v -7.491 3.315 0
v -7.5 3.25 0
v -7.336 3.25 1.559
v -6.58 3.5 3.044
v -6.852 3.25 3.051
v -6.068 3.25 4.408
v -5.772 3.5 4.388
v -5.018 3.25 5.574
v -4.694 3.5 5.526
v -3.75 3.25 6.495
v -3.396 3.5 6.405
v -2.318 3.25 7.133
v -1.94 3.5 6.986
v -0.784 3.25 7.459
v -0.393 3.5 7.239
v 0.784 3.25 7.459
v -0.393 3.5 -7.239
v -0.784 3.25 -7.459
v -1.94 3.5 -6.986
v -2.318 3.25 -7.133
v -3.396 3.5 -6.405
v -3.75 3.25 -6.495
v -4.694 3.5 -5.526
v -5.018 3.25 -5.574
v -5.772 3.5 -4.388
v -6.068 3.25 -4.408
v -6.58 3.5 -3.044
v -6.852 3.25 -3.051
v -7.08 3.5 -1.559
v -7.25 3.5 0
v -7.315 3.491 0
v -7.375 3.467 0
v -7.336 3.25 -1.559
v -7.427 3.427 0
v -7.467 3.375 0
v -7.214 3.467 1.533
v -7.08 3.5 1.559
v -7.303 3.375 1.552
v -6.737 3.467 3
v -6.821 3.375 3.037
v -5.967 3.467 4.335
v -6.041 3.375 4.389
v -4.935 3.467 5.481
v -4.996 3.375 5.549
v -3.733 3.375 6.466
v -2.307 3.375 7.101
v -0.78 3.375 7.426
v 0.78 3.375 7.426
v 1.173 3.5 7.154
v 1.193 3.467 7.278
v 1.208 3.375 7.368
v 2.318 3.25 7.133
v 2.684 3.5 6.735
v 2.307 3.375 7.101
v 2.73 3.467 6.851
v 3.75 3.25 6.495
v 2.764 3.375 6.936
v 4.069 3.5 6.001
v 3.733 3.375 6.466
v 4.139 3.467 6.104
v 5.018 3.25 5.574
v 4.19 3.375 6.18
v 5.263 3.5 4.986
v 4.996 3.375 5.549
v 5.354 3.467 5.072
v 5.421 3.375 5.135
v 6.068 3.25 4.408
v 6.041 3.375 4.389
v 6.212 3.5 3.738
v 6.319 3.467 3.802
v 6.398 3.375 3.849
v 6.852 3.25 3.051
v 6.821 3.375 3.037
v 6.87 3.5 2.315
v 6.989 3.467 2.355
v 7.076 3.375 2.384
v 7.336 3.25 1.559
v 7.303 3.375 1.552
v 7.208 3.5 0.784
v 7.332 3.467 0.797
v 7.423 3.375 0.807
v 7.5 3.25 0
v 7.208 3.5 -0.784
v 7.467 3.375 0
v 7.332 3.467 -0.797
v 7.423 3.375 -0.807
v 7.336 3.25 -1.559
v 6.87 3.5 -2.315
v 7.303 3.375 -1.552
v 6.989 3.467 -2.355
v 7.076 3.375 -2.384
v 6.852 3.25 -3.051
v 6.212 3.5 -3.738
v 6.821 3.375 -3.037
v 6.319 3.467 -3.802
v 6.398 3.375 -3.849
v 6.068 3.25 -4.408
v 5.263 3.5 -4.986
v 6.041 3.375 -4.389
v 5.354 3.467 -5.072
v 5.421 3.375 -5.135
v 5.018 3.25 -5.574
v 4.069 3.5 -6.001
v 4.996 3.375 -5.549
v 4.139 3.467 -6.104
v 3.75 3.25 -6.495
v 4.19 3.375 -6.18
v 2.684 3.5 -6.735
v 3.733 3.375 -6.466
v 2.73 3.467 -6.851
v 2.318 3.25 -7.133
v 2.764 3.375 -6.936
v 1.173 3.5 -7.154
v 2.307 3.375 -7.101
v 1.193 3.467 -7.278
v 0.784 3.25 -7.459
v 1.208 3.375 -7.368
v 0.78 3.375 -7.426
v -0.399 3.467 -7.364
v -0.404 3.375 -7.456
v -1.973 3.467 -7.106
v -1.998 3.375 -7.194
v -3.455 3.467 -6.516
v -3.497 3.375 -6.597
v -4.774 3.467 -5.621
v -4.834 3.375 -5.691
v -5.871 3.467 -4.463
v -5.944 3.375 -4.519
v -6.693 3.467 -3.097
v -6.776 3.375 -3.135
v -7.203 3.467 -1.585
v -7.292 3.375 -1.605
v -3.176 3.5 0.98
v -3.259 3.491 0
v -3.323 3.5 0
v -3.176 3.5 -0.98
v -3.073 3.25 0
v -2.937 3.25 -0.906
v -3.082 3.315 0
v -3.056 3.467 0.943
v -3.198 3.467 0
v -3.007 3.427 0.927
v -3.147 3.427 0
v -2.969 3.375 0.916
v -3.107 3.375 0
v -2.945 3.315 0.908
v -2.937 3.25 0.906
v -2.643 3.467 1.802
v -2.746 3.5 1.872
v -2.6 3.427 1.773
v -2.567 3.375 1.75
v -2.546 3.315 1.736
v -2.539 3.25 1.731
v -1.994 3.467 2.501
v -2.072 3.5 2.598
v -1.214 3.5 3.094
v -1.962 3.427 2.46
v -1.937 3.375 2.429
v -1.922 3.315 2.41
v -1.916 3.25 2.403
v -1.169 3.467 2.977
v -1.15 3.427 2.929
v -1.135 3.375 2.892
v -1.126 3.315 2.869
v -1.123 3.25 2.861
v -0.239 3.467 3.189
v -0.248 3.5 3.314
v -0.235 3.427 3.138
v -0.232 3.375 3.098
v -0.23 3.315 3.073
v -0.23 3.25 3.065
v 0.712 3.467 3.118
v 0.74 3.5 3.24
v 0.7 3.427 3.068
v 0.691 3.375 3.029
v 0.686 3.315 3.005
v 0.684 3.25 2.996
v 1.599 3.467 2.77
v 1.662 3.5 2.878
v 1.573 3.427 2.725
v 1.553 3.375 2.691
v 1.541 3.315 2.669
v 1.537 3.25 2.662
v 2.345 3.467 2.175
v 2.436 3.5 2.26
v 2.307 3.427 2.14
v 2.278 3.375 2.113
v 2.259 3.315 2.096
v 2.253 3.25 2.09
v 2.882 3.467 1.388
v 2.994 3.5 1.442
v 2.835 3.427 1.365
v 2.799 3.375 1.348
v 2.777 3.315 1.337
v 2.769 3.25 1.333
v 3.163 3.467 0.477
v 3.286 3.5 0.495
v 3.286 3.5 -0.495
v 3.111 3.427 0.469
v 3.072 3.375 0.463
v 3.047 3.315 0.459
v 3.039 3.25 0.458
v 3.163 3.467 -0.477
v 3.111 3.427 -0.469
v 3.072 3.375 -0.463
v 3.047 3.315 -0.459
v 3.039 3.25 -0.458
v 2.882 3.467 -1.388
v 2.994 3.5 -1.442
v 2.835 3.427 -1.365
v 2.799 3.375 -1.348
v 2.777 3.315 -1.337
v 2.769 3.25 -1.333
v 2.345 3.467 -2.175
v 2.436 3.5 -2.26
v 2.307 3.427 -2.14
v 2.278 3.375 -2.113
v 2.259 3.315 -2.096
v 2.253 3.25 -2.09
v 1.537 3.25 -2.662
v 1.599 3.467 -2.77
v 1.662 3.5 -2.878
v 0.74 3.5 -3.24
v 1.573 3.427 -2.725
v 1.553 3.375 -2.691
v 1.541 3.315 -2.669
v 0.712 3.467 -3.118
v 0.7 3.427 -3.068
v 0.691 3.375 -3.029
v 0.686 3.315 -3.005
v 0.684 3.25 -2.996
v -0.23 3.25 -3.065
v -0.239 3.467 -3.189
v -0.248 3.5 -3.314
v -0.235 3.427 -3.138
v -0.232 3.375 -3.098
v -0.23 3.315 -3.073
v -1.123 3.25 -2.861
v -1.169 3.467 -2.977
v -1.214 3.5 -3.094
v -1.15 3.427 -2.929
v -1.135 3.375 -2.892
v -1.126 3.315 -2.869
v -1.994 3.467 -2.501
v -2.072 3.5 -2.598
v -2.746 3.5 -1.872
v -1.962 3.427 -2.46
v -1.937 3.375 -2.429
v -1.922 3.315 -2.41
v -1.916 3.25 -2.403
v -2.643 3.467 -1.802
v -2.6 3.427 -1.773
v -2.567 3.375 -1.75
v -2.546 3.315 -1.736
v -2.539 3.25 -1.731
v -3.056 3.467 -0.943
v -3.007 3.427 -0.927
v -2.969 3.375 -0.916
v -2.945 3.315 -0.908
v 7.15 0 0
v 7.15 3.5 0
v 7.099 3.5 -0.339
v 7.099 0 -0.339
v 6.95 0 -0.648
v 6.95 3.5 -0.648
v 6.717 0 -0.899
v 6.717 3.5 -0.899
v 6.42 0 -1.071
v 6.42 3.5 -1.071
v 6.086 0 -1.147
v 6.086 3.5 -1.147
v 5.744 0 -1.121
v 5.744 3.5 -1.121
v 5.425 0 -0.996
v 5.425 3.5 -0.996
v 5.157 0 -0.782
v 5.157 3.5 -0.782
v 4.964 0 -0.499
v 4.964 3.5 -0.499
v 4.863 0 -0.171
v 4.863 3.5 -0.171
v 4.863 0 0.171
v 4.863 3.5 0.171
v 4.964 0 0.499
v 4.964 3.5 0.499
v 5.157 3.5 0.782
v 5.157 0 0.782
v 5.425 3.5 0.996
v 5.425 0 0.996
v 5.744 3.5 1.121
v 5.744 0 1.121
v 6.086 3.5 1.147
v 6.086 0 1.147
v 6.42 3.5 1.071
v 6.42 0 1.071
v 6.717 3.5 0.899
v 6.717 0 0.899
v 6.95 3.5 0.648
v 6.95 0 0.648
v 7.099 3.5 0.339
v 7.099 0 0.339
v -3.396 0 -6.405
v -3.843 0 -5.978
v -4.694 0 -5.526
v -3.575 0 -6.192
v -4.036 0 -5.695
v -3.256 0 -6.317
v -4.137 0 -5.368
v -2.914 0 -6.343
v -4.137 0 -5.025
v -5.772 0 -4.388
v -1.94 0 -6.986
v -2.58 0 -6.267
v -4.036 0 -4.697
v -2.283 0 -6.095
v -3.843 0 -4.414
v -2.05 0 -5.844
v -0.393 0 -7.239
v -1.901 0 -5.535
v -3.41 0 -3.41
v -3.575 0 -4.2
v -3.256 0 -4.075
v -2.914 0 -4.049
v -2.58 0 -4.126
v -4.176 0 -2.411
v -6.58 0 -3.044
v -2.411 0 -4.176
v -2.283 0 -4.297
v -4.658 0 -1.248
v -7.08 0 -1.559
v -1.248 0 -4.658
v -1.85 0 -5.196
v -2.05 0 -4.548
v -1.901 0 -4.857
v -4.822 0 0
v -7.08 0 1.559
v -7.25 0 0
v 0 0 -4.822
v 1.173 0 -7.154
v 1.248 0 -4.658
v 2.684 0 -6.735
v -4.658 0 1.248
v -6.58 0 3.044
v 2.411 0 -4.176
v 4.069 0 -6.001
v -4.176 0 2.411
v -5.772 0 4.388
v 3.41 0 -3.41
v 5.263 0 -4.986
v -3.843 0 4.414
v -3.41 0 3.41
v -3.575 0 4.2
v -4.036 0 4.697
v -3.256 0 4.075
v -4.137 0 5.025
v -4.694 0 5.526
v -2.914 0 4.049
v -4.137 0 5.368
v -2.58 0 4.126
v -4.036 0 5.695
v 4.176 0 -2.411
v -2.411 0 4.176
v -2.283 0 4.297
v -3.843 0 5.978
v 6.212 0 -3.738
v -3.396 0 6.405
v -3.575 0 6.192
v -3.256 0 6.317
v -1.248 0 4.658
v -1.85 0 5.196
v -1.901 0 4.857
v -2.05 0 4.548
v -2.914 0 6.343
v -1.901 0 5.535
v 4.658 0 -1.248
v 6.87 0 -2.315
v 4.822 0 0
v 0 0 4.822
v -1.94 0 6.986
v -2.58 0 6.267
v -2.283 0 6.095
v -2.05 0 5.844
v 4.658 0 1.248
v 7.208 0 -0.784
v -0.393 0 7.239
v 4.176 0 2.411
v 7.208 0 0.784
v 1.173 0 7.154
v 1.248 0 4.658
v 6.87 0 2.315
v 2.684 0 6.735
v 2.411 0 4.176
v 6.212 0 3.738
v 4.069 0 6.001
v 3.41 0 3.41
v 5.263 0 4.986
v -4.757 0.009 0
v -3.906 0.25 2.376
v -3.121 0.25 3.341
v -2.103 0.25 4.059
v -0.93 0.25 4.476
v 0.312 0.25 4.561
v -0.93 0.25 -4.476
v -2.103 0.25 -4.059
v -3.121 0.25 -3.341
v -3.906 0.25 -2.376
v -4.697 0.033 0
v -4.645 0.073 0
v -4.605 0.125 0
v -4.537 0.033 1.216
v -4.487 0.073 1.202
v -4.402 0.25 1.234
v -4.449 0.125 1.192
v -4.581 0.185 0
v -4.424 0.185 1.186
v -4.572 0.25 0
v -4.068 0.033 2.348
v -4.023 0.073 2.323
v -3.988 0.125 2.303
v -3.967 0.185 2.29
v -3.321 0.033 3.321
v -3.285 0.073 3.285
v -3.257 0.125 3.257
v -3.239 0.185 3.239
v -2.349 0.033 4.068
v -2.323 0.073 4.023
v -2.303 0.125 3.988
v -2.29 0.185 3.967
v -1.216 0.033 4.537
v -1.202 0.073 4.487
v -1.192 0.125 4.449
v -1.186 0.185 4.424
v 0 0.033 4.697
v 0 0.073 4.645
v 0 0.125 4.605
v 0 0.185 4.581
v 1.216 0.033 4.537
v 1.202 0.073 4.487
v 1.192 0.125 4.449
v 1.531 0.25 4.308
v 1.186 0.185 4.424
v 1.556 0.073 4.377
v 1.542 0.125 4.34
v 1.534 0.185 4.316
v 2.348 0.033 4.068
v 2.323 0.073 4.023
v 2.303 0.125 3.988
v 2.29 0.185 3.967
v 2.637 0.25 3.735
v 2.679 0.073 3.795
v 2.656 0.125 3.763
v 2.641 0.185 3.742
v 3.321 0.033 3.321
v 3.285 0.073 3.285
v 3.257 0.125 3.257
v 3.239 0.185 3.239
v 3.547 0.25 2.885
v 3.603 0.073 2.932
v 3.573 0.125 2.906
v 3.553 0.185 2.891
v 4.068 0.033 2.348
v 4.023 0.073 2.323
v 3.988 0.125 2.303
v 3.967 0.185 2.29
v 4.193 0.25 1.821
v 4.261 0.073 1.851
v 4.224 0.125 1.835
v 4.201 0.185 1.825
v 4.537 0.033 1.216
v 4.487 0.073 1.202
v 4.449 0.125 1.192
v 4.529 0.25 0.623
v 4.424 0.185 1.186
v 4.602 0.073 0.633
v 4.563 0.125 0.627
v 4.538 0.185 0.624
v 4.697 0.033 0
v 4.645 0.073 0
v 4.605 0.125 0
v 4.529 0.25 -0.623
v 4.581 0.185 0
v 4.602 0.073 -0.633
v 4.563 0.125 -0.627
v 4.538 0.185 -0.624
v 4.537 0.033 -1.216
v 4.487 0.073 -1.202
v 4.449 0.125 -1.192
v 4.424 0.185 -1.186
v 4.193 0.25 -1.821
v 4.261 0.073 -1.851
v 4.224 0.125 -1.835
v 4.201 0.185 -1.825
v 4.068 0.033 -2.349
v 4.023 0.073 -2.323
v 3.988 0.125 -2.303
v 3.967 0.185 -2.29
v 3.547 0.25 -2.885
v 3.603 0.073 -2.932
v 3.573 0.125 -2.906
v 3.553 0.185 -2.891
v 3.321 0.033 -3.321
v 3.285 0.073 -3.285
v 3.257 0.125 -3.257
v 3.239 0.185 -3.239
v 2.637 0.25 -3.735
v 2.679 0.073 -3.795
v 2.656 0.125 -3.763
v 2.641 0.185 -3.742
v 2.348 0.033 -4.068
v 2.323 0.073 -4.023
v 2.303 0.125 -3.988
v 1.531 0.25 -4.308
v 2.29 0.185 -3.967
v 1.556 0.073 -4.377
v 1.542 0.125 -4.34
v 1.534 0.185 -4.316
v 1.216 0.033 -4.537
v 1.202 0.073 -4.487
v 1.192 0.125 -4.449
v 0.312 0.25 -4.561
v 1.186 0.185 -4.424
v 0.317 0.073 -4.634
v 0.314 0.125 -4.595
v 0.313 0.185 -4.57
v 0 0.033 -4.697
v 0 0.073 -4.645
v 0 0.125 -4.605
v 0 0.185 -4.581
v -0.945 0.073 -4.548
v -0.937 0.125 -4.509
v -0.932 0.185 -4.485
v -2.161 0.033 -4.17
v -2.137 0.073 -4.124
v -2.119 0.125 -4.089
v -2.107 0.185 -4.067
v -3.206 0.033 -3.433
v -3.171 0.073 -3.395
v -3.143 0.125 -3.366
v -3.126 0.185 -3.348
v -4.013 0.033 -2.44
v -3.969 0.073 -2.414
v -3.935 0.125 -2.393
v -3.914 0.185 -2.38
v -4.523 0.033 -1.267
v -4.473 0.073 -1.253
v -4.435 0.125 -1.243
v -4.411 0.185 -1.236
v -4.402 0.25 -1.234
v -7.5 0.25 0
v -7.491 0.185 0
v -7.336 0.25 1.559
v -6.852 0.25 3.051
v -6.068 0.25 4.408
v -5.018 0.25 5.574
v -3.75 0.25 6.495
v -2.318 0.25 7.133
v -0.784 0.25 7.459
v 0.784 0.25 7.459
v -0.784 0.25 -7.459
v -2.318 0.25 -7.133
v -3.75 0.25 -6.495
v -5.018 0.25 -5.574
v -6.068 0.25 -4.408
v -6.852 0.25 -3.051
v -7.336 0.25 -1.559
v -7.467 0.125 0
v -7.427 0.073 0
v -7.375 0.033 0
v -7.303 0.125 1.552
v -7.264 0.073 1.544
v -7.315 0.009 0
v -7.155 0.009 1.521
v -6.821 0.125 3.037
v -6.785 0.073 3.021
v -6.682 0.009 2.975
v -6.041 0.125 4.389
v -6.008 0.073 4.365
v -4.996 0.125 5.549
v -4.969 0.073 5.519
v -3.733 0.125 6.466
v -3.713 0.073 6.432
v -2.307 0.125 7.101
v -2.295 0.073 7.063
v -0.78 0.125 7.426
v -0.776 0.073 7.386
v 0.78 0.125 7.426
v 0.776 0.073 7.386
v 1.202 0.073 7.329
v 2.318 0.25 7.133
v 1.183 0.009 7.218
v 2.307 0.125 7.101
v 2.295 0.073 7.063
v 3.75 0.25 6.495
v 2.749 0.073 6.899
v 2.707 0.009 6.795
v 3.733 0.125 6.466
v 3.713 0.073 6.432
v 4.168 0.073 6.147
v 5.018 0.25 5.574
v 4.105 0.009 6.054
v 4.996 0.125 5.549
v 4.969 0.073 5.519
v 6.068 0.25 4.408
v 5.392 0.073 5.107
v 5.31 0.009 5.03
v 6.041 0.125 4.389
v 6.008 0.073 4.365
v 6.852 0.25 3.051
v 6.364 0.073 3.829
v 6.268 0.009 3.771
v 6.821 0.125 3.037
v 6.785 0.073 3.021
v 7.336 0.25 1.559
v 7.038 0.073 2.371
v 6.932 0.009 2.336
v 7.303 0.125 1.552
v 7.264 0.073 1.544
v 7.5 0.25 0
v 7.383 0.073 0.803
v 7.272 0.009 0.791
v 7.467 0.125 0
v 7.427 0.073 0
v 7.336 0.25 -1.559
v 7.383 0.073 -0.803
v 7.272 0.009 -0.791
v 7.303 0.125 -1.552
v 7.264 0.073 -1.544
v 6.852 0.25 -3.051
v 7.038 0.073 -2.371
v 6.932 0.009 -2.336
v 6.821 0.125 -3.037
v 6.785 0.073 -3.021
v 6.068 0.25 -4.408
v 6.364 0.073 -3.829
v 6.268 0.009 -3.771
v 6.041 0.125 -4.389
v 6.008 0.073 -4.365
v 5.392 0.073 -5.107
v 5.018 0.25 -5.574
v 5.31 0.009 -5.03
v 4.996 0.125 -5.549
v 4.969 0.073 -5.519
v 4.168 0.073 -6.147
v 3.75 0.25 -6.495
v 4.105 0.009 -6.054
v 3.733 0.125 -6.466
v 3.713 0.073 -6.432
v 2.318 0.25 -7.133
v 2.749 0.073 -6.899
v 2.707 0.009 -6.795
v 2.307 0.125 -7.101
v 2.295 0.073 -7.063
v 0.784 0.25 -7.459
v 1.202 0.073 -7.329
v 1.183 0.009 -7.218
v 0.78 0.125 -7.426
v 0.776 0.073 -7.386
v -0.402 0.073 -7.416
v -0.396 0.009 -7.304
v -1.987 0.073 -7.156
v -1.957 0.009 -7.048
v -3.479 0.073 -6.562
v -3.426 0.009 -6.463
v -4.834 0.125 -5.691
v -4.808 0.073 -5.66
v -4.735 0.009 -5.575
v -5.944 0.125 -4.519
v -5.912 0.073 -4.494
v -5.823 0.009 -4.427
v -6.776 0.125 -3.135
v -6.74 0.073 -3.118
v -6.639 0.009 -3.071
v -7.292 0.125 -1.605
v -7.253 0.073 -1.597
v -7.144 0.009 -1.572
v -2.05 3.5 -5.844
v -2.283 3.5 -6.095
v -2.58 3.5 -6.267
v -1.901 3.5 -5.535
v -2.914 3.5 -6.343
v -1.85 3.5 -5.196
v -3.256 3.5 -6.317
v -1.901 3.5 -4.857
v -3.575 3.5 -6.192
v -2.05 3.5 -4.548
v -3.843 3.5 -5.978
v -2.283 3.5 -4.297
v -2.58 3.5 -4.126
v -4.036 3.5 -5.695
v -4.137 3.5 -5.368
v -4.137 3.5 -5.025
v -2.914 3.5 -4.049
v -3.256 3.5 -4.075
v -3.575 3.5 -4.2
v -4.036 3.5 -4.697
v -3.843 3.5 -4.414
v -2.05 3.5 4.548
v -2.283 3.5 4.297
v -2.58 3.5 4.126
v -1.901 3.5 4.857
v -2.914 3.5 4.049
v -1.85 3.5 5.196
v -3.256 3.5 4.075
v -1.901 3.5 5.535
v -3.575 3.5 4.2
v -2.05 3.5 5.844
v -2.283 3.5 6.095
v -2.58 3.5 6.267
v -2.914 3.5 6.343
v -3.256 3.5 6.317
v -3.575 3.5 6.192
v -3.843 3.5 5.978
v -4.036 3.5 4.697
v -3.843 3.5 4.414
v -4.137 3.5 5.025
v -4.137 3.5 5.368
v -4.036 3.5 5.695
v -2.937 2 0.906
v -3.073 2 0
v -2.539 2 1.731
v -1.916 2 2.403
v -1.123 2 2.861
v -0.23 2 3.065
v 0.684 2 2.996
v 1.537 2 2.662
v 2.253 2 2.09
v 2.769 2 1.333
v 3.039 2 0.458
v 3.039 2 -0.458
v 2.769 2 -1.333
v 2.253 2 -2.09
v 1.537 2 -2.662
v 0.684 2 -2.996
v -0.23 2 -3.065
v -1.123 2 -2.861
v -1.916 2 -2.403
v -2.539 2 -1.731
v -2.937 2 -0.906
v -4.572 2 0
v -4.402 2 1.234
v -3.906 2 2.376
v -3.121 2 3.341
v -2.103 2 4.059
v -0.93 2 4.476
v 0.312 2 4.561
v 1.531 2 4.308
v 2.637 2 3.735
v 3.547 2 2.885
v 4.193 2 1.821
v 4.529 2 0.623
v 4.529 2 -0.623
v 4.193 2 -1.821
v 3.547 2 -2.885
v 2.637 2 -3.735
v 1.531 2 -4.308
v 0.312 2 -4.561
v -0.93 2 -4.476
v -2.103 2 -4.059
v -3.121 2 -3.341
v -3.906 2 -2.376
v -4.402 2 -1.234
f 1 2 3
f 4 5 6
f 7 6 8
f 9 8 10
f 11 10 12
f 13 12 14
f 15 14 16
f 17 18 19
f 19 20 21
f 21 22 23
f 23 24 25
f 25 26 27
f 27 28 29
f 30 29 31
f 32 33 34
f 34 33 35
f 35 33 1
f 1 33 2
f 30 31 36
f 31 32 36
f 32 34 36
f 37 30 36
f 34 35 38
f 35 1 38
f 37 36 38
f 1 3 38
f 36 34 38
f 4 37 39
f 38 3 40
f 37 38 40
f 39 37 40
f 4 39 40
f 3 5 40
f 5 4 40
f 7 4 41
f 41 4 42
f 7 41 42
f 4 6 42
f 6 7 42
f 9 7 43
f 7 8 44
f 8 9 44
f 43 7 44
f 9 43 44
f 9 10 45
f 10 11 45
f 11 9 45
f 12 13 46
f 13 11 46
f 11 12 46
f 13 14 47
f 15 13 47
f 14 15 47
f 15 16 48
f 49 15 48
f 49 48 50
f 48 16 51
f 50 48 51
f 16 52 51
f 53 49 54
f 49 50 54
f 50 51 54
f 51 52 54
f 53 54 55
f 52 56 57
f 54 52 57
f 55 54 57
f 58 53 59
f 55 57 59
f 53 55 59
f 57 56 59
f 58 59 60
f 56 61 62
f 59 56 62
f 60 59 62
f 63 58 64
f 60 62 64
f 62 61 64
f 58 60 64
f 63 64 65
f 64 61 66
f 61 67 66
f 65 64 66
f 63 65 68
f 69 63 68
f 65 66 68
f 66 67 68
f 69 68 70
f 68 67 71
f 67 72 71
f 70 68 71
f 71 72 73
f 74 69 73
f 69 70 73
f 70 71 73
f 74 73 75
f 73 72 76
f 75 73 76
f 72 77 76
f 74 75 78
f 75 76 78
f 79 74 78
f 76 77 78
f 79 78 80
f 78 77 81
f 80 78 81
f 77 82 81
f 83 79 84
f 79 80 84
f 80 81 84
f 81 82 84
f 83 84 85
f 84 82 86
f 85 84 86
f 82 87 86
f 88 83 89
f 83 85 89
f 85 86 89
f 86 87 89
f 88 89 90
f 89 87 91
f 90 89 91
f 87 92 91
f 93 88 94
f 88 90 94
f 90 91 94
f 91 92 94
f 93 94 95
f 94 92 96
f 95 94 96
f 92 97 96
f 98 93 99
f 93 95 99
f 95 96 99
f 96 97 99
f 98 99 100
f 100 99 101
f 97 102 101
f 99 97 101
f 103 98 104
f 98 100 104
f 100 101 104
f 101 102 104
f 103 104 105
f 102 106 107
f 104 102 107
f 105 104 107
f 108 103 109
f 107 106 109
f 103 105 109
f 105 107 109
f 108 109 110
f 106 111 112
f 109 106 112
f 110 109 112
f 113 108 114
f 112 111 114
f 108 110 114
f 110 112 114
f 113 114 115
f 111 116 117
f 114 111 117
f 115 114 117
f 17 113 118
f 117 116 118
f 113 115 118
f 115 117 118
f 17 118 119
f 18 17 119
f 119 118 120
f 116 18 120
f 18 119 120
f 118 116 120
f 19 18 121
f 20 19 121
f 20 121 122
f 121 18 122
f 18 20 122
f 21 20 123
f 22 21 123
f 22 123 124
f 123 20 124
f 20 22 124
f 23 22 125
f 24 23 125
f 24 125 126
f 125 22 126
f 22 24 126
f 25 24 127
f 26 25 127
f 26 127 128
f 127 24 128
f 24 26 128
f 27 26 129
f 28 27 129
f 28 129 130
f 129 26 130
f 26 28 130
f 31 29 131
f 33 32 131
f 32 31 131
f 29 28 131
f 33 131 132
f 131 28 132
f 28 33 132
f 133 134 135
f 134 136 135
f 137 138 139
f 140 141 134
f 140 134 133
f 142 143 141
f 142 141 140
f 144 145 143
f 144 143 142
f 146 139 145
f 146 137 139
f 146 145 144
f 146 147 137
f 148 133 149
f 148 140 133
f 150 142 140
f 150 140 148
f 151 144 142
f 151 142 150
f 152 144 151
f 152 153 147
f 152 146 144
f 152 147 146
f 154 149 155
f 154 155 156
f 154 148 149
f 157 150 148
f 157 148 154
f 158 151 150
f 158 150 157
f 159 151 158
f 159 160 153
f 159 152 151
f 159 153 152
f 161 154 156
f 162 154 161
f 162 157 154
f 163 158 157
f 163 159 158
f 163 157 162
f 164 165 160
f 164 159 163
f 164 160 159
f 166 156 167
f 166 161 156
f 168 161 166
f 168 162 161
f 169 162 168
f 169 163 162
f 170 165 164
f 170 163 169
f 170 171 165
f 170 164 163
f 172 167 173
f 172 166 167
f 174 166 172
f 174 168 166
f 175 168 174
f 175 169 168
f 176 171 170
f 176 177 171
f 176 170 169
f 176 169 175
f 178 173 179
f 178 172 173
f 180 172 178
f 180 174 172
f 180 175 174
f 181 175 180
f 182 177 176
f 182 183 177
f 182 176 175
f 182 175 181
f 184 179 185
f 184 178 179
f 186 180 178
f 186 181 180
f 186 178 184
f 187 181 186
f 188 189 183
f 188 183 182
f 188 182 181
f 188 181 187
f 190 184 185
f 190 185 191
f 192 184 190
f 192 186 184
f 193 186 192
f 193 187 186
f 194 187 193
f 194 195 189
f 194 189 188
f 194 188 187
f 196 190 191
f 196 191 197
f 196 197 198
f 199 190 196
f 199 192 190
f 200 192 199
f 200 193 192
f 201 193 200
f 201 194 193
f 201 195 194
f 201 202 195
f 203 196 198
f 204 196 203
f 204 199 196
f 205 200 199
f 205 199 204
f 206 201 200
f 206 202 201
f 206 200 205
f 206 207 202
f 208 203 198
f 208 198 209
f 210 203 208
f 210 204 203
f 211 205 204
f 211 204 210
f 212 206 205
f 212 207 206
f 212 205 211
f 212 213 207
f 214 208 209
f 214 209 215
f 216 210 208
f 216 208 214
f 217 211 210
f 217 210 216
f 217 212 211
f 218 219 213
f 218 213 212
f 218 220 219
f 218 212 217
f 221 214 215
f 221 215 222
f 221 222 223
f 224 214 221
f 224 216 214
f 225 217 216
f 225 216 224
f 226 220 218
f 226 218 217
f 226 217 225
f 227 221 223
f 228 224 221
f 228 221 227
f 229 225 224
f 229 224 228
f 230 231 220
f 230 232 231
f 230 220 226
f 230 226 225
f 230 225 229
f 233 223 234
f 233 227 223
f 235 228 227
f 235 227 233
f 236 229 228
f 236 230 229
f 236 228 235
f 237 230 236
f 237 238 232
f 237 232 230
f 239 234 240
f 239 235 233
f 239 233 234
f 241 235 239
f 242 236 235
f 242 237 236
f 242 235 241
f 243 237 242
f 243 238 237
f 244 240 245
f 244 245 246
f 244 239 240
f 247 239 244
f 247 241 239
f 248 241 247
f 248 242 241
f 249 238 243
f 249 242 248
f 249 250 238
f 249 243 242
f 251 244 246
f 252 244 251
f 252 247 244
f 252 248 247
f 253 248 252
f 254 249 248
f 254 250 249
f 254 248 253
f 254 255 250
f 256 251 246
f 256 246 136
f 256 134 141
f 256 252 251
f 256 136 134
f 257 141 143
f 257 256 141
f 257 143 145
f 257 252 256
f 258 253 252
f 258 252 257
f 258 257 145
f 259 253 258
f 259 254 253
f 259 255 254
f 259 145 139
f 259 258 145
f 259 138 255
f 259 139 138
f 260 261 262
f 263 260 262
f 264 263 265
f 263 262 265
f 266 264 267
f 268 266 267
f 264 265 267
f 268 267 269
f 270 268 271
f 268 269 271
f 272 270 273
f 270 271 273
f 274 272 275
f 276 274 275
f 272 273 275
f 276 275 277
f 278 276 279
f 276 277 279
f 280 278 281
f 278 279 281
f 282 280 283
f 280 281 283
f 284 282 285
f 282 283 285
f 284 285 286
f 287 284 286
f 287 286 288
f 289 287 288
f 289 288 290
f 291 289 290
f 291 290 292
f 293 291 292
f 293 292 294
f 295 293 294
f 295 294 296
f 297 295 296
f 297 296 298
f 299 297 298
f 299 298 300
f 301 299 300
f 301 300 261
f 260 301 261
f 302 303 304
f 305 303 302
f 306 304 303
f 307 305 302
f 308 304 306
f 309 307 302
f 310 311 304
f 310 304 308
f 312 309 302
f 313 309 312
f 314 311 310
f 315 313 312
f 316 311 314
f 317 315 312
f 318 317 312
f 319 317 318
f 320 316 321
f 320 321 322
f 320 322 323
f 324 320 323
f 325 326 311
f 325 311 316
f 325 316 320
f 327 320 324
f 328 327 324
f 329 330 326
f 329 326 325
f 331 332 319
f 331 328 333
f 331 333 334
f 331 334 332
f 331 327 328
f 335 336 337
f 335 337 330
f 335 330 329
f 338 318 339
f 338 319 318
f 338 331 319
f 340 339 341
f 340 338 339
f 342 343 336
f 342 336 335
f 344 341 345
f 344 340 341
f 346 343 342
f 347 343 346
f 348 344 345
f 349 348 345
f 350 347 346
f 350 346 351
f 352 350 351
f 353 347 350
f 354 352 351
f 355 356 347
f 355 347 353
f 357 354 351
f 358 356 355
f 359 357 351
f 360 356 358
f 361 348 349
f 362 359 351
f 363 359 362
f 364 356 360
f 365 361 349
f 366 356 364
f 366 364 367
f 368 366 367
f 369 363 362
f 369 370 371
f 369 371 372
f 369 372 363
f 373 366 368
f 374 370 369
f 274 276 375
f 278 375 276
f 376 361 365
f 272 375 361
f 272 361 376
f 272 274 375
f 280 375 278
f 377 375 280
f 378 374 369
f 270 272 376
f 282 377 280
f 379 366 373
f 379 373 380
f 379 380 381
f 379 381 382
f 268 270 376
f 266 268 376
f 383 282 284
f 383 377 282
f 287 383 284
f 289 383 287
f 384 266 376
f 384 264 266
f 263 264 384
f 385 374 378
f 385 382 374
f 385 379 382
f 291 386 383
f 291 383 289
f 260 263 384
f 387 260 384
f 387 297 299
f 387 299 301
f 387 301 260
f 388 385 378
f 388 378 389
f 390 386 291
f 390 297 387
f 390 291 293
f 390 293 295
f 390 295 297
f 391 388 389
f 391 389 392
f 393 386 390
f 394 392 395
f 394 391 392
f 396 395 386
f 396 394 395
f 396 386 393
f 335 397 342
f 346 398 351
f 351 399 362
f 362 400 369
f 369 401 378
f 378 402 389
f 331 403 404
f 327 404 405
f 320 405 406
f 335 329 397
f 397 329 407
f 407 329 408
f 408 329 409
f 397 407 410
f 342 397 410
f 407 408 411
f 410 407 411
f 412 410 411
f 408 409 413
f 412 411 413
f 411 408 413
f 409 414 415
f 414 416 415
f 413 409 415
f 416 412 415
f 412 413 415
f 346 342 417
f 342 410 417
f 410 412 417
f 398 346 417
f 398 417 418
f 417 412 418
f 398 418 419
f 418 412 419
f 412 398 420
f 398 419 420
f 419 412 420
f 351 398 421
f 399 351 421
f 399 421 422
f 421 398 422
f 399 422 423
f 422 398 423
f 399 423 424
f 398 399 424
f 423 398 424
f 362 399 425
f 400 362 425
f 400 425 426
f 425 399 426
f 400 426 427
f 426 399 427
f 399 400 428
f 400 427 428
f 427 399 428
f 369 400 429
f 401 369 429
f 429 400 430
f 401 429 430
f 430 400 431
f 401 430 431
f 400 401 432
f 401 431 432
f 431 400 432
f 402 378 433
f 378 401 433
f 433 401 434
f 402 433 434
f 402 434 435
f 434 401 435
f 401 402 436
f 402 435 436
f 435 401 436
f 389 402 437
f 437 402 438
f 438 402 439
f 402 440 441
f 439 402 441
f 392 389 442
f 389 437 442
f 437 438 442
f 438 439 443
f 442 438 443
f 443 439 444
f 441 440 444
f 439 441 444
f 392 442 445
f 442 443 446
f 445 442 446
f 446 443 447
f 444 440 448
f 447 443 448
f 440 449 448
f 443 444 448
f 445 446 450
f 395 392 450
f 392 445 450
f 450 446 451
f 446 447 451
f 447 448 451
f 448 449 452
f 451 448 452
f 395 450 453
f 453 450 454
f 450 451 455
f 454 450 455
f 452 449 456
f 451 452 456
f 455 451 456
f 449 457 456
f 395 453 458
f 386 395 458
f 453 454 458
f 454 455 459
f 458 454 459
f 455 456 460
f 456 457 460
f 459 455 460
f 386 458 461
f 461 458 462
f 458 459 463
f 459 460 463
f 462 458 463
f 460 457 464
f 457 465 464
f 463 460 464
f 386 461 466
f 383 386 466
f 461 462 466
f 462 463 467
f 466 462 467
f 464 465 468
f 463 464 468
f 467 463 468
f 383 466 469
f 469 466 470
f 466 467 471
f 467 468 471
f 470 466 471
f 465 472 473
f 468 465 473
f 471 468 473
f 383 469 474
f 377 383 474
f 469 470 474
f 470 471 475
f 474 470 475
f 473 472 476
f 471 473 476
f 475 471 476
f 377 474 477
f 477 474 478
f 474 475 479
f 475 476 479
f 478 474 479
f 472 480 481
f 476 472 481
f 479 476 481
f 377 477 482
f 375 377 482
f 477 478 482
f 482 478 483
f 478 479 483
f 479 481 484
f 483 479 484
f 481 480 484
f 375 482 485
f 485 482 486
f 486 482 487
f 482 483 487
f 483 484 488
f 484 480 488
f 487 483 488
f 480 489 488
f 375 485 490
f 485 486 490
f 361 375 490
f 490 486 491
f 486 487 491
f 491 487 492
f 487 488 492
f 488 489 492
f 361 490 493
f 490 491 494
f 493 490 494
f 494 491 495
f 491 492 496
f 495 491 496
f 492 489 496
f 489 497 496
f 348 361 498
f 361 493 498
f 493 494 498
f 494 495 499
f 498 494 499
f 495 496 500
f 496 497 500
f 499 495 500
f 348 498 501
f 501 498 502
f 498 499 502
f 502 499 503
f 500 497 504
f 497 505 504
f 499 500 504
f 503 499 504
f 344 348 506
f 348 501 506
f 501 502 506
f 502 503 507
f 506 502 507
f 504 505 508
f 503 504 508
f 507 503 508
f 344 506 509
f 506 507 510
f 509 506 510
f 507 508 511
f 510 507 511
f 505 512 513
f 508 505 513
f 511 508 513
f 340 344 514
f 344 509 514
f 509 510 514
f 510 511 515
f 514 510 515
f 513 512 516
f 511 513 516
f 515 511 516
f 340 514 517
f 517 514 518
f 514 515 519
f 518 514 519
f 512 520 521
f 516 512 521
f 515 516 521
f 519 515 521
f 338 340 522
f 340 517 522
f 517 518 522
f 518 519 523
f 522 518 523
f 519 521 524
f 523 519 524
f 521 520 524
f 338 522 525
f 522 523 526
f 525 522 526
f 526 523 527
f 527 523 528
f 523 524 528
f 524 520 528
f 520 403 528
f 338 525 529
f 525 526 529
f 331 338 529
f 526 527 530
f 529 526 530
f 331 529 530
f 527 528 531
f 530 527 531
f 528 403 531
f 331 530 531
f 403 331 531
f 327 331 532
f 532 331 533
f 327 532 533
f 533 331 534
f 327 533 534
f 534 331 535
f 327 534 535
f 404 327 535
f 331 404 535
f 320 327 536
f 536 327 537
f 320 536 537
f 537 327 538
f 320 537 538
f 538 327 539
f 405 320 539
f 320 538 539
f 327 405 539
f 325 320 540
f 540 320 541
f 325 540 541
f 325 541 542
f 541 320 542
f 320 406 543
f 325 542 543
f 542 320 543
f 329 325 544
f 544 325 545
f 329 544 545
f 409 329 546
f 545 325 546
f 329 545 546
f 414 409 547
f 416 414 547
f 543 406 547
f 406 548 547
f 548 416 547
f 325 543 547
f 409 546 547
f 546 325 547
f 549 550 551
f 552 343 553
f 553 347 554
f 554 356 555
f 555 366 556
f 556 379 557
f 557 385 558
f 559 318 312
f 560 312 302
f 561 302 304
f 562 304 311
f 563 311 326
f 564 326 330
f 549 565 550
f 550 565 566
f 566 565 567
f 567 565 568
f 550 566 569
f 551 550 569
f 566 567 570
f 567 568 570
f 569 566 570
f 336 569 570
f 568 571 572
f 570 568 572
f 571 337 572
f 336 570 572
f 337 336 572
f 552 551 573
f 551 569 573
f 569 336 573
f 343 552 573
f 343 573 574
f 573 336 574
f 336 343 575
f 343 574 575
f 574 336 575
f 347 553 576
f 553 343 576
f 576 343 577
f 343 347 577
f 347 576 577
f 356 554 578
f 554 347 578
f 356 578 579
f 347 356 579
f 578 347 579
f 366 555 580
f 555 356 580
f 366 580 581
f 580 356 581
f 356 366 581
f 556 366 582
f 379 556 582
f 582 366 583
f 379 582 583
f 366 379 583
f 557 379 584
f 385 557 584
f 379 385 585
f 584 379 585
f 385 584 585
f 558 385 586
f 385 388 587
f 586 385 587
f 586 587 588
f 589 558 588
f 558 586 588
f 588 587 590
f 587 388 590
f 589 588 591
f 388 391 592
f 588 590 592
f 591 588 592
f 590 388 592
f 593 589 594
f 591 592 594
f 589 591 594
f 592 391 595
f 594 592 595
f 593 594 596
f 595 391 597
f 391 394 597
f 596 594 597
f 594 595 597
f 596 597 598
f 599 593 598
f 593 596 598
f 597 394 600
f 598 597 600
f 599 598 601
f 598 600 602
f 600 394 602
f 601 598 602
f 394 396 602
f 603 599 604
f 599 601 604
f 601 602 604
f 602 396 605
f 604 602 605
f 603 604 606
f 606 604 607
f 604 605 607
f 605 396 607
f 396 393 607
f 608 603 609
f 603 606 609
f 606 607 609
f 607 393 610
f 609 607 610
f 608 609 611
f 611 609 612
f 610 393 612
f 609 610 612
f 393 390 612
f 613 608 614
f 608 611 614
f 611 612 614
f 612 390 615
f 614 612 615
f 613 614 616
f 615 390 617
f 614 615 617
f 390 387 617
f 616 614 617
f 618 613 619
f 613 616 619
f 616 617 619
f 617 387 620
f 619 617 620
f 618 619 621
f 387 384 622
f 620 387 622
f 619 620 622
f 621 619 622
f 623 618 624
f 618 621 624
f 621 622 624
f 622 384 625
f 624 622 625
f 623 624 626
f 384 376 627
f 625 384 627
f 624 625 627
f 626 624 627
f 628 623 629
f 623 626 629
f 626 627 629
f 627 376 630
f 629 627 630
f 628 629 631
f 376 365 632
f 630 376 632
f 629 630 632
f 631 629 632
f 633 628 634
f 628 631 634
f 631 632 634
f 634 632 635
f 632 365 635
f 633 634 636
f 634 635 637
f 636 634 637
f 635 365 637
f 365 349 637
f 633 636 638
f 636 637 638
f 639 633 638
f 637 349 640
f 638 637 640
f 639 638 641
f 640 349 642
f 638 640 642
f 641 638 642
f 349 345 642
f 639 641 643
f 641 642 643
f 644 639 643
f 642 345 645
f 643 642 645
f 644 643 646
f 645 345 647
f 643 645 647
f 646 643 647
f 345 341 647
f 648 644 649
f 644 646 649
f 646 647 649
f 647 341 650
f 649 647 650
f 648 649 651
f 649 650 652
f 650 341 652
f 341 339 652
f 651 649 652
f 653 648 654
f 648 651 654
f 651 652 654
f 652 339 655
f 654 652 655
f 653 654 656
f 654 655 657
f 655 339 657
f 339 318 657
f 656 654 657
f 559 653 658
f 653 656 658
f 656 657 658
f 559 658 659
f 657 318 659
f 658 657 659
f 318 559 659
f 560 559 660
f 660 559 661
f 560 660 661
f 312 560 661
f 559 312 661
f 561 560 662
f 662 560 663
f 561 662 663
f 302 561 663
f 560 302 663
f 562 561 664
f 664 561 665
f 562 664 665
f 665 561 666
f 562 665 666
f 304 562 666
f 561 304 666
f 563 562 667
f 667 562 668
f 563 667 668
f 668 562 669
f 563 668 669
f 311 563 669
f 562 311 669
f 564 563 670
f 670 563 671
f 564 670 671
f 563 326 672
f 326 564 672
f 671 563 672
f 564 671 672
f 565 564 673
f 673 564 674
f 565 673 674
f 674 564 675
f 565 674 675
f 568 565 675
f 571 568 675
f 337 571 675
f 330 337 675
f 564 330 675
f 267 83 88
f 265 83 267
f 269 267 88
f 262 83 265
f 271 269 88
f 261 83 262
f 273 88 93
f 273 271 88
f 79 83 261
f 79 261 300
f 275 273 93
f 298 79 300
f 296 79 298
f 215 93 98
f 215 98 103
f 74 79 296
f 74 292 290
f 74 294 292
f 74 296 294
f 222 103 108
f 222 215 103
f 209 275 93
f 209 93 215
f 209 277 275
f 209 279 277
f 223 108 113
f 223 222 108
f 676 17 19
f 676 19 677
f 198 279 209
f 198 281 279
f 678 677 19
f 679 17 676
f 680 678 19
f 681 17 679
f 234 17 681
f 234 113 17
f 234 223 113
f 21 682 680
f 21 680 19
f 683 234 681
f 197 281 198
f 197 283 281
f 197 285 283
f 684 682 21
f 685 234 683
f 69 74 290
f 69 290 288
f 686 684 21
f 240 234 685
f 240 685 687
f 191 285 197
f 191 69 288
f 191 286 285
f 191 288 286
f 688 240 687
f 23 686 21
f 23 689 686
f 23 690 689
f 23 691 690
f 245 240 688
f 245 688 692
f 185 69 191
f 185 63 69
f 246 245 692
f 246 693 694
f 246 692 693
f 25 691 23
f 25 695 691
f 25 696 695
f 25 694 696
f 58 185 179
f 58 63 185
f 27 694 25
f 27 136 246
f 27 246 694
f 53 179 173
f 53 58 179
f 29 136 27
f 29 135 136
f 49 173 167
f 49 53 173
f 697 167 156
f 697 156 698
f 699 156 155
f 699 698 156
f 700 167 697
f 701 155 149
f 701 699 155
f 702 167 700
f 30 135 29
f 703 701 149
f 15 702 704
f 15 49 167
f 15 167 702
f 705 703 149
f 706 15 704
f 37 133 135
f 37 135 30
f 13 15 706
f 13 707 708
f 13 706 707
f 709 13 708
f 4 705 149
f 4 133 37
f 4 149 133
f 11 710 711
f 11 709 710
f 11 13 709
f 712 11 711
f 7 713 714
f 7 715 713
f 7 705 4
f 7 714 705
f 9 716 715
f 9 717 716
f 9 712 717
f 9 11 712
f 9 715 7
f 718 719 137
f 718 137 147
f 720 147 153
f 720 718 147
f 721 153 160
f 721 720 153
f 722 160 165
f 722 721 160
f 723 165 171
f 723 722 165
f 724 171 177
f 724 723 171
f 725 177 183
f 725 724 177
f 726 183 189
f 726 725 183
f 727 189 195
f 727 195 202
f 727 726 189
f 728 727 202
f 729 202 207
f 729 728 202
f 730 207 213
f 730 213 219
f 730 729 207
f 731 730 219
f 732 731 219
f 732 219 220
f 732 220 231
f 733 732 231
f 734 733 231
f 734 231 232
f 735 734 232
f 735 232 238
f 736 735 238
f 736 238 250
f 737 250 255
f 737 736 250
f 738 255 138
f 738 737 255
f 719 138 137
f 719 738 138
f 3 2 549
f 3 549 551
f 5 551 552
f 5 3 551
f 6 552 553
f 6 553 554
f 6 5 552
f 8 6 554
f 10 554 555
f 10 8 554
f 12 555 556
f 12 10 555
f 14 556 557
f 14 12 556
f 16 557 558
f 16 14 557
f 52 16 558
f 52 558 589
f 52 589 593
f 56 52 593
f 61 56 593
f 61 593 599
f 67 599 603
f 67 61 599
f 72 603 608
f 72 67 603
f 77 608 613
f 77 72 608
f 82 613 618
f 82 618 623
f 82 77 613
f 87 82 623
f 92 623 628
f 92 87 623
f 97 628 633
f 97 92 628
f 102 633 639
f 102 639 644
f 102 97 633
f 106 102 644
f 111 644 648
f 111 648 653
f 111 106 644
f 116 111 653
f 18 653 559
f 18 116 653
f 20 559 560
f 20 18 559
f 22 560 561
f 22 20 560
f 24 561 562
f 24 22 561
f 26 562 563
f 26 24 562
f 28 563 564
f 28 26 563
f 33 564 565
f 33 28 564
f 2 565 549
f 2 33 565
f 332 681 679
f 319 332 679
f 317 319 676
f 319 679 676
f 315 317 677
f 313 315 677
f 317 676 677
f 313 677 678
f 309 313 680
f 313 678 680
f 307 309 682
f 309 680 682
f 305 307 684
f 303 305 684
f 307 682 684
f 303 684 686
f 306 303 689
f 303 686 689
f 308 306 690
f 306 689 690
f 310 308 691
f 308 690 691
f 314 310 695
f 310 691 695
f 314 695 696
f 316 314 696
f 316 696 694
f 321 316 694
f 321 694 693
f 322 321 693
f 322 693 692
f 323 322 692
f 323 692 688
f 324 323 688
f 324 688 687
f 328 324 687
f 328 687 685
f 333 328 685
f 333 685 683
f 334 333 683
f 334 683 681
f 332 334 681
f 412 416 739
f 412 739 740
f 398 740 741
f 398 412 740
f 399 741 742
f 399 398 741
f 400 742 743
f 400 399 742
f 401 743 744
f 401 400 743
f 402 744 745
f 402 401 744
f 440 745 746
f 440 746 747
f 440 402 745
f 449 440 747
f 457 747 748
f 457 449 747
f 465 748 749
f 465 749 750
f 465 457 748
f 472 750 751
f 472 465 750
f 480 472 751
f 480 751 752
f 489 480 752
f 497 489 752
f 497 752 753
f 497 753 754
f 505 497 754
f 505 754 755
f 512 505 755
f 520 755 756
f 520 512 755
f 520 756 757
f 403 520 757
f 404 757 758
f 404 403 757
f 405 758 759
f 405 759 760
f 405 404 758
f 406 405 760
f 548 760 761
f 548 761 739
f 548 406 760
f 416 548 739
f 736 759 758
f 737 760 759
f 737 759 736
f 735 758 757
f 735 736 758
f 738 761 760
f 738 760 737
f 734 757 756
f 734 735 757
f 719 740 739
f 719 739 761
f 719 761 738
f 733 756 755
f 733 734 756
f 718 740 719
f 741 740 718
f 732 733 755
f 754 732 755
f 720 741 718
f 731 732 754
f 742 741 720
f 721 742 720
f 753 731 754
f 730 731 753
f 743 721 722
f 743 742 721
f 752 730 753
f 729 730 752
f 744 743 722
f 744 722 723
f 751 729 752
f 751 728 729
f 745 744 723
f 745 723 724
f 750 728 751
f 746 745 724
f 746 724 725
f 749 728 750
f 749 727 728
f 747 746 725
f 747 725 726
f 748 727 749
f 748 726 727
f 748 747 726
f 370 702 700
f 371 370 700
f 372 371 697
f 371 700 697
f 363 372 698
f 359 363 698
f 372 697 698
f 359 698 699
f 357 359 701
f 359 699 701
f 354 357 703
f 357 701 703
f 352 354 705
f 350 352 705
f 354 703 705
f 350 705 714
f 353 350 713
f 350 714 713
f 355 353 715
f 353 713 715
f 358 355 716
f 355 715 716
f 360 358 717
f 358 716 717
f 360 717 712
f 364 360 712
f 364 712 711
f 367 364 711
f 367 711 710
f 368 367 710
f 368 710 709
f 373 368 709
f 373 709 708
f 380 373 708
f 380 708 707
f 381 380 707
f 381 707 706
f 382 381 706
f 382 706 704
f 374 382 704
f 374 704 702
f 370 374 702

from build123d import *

# Parameters (mm, degrees)
SKETCH2_R          = 1.15
CUT_EXTRUDE1_DEPTH = 10
FILLET3_R          = 0.25
FILLET4_R          = 0.25
FILLET5_R          = 0.25


with BuildPart() as part:
    # Sketch1 → Revolve1 (revolve)
    with BuildSketch(Plane.XY):
        Polygon((-4.572, 0), (-7.5, 0), (-7.5, 3.5), (-3.0734, 3.5), (-3.0734, 2), (-4.572, 2), align=None)
    revolve(axis=Axis((0, 0, 0), (0, 1, 0)))

    # Sketch2 → Cut-Extrude1 (cut)
    with BuildSketch(Plane(origin=(0, 3.5, 0), x_dir=(1, 0, 0), z_dir=(0, 1, 0))):
        with Locations((6, 0)):
            Circle(SKETCH2_R)
        with Locations((-3, -5.196152423)):
            Circle(SKETCH2_R)
        with Locations((-3, 5.196152423)):
            Circle(SKETCH2_R)
    extrude(amount=-CUT_EXTRUDE1_DEPTH, mode=Mode.SUBTRACT)

    # Fillet3
    fillet3_edges = [part.edges().sort_by_distance(p)[0] for p in [
        (3.0734, 3.5, 0),
    ]]
    fillet(fillet3_edges, radius=FILLET3_R)

    # Fillet4
    fillet4_edges = [part.edges().sort_by_distance(p)[0] for p in [
        (7.5, 3.5, 0),
    ]]
    fillet(fillet4_edges, radius=FILLET4_R)

    # Fillet5
    fillet5_edges = [part.edges().sort_by_distance(p)[0] for p in [
        (7.5, 0, 0),
        (4.572, 0, 0),
    ]]
    fillet(fillet5_edges, radius=FILLET5_R)


solid = part.part
